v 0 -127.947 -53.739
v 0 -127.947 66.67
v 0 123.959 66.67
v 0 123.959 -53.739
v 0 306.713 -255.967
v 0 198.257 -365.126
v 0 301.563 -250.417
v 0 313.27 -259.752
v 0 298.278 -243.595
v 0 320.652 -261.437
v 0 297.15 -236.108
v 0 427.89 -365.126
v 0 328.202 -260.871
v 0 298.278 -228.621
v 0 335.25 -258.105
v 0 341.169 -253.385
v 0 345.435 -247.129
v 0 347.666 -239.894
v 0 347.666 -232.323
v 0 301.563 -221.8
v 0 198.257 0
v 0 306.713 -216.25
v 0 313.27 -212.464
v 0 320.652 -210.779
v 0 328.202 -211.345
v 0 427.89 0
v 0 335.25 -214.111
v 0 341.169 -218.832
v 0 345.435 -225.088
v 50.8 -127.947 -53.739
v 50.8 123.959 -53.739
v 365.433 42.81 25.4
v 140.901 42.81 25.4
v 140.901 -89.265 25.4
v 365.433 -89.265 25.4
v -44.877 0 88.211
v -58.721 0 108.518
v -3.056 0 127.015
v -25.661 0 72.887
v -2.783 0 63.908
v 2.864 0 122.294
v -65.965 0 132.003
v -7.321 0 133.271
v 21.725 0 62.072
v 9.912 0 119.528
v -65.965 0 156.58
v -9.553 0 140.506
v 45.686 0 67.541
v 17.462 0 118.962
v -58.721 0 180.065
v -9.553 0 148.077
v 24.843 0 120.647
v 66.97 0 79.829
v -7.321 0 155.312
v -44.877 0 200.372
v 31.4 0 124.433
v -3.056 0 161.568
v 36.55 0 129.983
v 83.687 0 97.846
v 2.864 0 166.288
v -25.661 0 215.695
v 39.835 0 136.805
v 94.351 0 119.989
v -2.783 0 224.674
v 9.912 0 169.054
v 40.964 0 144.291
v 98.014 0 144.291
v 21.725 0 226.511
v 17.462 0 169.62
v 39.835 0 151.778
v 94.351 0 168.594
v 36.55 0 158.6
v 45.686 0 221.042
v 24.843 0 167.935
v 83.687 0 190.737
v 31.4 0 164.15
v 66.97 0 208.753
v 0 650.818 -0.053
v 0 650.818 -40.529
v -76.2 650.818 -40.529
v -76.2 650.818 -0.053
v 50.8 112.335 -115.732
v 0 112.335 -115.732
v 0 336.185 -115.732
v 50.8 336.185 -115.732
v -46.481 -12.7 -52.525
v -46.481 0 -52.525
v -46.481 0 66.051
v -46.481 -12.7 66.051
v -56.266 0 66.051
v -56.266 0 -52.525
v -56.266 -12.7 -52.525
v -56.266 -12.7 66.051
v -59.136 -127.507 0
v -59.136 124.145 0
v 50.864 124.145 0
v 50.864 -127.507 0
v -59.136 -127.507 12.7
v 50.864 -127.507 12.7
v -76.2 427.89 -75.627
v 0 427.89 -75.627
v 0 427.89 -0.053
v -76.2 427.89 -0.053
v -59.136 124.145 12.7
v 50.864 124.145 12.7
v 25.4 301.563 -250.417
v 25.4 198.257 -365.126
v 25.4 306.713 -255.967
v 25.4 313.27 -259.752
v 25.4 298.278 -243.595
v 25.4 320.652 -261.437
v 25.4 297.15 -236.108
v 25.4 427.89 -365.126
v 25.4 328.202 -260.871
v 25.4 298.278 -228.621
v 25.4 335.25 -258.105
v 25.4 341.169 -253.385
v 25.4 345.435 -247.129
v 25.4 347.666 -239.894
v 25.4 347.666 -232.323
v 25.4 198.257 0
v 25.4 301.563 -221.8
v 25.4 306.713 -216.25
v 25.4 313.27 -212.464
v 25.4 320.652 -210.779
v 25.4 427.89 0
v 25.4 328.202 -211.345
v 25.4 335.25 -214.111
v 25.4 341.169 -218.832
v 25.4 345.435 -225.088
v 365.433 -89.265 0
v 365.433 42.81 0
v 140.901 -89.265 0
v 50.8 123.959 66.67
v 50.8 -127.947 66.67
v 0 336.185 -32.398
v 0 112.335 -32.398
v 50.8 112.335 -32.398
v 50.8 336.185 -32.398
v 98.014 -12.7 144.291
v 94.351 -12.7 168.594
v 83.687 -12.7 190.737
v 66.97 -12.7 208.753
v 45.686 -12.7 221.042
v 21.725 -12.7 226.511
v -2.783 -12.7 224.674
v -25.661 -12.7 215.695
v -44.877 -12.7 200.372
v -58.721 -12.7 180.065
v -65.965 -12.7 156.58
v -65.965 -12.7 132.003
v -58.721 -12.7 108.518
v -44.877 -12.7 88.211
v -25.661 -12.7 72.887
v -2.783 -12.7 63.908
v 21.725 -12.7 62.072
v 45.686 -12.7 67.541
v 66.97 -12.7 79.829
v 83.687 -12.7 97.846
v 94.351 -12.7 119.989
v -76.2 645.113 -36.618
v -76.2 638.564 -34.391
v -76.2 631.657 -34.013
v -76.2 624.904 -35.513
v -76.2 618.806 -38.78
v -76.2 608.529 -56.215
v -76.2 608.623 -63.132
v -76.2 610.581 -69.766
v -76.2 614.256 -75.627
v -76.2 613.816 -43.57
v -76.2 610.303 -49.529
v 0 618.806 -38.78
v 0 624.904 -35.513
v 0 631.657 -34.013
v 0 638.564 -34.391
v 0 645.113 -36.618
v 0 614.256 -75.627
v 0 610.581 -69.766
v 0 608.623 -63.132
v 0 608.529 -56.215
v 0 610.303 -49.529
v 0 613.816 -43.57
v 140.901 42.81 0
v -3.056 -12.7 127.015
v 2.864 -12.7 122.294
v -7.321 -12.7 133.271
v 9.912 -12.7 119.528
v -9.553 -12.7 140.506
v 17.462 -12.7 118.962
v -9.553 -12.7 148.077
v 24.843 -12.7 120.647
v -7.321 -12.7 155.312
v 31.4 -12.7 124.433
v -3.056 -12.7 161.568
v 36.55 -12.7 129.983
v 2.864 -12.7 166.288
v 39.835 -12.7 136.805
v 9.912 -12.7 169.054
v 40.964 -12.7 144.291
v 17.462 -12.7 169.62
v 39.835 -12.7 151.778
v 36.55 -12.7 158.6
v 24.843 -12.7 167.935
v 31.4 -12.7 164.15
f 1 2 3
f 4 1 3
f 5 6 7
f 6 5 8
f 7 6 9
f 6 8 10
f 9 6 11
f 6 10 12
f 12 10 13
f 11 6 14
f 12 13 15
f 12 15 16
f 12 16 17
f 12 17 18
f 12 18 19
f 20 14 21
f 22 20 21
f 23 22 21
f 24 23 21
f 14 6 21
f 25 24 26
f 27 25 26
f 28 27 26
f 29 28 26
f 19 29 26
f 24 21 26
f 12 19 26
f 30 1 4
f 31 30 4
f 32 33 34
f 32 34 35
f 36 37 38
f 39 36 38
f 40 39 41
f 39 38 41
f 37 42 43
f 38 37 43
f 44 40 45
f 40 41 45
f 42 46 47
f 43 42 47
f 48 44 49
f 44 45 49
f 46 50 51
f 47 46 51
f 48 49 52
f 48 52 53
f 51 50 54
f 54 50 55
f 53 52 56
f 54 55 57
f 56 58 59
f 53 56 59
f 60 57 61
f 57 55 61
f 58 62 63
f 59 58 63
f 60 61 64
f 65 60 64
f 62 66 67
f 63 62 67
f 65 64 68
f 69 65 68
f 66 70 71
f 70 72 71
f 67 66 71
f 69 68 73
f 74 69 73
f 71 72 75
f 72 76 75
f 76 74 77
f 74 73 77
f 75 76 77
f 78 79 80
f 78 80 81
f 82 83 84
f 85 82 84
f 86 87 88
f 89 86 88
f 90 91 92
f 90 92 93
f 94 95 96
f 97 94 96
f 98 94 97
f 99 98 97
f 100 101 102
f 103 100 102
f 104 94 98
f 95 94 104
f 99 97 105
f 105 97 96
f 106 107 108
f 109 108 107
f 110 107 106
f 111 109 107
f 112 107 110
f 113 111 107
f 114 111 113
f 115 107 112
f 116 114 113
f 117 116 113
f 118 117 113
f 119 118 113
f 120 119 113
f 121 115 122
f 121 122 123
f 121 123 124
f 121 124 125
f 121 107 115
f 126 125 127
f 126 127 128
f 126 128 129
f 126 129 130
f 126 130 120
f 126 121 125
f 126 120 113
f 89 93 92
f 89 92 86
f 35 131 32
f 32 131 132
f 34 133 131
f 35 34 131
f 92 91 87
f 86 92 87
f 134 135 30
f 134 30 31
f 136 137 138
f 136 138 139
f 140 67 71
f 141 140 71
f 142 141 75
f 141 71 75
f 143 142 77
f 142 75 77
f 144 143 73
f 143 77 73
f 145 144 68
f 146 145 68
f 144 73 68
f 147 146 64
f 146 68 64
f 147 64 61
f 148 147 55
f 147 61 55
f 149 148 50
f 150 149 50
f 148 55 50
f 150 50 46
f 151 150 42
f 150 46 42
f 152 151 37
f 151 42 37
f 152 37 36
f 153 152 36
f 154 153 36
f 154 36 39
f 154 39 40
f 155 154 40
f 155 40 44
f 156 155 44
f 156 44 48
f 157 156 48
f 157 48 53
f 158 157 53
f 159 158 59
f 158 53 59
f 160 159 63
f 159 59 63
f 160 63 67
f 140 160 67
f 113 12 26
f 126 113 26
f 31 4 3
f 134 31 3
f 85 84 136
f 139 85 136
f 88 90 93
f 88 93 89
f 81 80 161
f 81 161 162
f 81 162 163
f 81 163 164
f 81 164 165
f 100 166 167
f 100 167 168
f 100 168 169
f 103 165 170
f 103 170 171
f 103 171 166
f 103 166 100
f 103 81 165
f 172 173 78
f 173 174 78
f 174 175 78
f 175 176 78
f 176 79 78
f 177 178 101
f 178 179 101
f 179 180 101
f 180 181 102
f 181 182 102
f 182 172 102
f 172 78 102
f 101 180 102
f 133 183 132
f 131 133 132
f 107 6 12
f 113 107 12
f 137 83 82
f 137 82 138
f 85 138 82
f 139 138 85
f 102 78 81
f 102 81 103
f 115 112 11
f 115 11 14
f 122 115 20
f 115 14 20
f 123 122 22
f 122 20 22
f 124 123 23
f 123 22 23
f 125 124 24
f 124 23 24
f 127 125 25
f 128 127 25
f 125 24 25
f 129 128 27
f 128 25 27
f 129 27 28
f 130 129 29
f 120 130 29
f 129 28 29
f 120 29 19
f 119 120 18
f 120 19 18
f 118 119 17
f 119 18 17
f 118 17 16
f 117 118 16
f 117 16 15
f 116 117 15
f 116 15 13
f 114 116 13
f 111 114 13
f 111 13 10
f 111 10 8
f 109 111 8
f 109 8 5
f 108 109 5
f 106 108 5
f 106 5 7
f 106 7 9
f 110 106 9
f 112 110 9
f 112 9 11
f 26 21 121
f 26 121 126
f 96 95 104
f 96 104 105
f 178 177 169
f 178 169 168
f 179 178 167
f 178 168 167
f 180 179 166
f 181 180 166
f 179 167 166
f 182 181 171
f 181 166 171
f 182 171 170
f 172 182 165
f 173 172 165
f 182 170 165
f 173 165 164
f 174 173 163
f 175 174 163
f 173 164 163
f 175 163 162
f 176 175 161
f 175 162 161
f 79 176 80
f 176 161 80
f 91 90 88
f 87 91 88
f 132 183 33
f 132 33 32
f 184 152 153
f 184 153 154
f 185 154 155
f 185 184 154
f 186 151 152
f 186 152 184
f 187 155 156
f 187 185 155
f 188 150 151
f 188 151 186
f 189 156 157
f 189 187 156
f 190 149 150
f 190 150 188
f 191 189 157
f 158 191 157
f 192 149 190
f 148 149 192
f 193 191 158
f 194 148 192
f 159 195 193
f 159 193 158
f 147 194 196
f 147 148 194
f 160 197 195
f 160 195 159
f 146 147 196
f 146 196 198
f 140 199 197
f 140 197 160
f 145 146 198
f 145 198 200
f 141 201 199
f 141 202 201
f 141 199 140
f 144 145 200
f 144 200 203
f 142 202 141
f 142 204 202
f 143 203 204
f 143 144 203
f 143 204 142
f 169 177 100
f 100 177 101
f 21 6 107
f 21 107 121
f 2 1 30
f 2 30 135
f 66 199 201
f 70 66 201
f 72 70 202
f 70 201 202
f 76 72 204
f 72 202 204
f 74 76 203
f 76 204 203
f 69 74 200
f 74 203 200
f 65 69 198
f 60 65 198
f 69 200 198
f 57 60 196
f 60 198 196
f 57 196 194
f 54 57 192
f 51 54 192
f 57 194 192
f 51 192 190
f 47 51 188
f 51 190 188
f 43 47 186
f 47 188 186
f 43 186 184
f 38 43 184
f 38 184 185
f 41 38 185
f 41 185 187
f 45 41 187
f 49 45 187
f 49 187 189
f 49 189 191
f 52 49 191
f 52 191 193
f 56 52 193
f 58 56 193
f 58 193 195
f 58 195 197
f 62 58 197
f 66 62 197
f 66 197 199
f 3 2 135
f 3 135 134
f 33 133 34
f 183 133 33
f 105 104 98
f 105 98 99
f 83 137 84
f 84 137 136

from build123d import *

# Parameters (mm, degrees)
F0_W      = 251.9057244062
F0_H      = 120.4088665545
F1_DEPTH  = 50.8
F2_W      = 9.7853951156
F2_H      = 118.5759752989
F3_DEPTH  = 12.7
F5_DEPTH  = 12.7
F6_W      = 109.9998280406
F6_H      = 251.6520246863
F7_DEPTH  = 12.7
F9_D      = 50.8
F10_W     = 224.532097578
F10_H     = 132.0753507316
F11_DEPTH = 25.4
F12_W     = 229.6327352524
F12_H     = 365.1259541512
F13_DEPTH = 25.4
F18_W     = 223.8502129912
F18_H     = 83.3336301148
F19_DEPTH = 50.8
F20_W     = 222.9283154011
F20_H     = 75.5738317966
F21_DEPTH = 76.2
F23_D     = 50.8
F25_D     = 50.8


# Not quite as in the source:
# - the program builds the solid bodies; features that only make, move or delete a surface that nothing else refers to are left out


with BuildPart() as f1:
    # F0 (on Right) → F1 (new body)
    with BuildSketch(Plane.YZ):
        with Locations((-1.9939765334, 6.465299055)):
            Rectangle(F0_W, F0_H)
    extrude(amount=F1_DEPTH)


with BuildPart() as f3:
    # F2 (on Front) → F3 (new body)
    with BuildSketch(Plane.XZ):
        with Locations((-51.3733271509, 6.7634359002)):
            Rectangle(F2_W, F2_H)
    extrude(amount=F3_DEPTH)


with BuildPart() as f5:
    # F4 (on Front) → F5 (new body)
    with BuildSketch(Plane.XZ):
        with BuildLine():
            ThreePointArc((39.5767722748, 65.4155793169), (81.8127708761, 95.209089617), (98.0136903376, 144.2912966013))
            ThreePointArc((98.0136903376, 144.2912966013), (-50.6854651748, 193.3735035856), (39.5767722748, 65.4155793169))
        make_face()
    extrude(amount=F5_DEPTH)

    # F9 (through all)
    with Locations(Plane(origin=(0, 0, 0), x_dir=(-1, 0, 0), z_dir=(0, 1, 0))):
        with Locations((-15.5636528507, 144.2912966013)):
            Hole(F9_D / 2)


with BuildPart() as f7:
    # F6 (on Top) → F7 (new body)
    with BuildSketch(Plane.XY):
        with Locations((-4.1358657181, -1.6805864871)):
            Rectangle(F6_W, F6_H)
    extrude(amount=F7_DEPTH)


with BuildPart() as f11:
    # F10 (on Top) → F11 (new body)
    with BuildSketch(Plane.XY):
        with Locations((253.1674355268, -23.22778292)):
            Rectangle(F10_W, F10_H)
    extrude(amount=F11_DEPTH)


with BuildPart() as f13:
    # F12 (on Right) → F13 (new body)
    with BuildSketch(Plane.YZ):
        with Locations((313.0736649036, -182.5629770756)):
            Rectangle(F12_W, F12_H)
    extrude(amount=F13_DEPTH)

    # F23 (through all)
    with Locations(Plane.YZ.offset(25.4)):
        with Locations((322.5499093533, -236.1082434654)):
            Hole(F23_D / 2)


with BuildPart() as f19:
    # F18 (on Right) → F19 (new body)
    with BuildSketch(Plane.YZ):
        with Locations((224.2599911988, -74.0652363747)):
            Rectangle(F18_W, F18_H)
    extrude(amount=F19_DEPTH)


with BuildPart() as f21:
    # F20 (on face) → F21 (new body)
    with BuildSketch(Plane(origin=(0, 0, 0), x_dir=(0, -1, 0), z_dir=(-1, 0, 0))):
        with Locations((-539.3541902304, -37.8398001194)):
            Rectangle(F20_W, F20_H)
    extrude(amount=F21_DEPTH)

    # F25 (through all)
    with Locations(Plane.YZ):
        with Locations((633.7370872498, -59.328019619)):
            Hole(F25_D / 2)


solid = Compound([f1.part, f3.part, f5.part, f7.part, f11.part, f13.part, f19.part, f21.part])
